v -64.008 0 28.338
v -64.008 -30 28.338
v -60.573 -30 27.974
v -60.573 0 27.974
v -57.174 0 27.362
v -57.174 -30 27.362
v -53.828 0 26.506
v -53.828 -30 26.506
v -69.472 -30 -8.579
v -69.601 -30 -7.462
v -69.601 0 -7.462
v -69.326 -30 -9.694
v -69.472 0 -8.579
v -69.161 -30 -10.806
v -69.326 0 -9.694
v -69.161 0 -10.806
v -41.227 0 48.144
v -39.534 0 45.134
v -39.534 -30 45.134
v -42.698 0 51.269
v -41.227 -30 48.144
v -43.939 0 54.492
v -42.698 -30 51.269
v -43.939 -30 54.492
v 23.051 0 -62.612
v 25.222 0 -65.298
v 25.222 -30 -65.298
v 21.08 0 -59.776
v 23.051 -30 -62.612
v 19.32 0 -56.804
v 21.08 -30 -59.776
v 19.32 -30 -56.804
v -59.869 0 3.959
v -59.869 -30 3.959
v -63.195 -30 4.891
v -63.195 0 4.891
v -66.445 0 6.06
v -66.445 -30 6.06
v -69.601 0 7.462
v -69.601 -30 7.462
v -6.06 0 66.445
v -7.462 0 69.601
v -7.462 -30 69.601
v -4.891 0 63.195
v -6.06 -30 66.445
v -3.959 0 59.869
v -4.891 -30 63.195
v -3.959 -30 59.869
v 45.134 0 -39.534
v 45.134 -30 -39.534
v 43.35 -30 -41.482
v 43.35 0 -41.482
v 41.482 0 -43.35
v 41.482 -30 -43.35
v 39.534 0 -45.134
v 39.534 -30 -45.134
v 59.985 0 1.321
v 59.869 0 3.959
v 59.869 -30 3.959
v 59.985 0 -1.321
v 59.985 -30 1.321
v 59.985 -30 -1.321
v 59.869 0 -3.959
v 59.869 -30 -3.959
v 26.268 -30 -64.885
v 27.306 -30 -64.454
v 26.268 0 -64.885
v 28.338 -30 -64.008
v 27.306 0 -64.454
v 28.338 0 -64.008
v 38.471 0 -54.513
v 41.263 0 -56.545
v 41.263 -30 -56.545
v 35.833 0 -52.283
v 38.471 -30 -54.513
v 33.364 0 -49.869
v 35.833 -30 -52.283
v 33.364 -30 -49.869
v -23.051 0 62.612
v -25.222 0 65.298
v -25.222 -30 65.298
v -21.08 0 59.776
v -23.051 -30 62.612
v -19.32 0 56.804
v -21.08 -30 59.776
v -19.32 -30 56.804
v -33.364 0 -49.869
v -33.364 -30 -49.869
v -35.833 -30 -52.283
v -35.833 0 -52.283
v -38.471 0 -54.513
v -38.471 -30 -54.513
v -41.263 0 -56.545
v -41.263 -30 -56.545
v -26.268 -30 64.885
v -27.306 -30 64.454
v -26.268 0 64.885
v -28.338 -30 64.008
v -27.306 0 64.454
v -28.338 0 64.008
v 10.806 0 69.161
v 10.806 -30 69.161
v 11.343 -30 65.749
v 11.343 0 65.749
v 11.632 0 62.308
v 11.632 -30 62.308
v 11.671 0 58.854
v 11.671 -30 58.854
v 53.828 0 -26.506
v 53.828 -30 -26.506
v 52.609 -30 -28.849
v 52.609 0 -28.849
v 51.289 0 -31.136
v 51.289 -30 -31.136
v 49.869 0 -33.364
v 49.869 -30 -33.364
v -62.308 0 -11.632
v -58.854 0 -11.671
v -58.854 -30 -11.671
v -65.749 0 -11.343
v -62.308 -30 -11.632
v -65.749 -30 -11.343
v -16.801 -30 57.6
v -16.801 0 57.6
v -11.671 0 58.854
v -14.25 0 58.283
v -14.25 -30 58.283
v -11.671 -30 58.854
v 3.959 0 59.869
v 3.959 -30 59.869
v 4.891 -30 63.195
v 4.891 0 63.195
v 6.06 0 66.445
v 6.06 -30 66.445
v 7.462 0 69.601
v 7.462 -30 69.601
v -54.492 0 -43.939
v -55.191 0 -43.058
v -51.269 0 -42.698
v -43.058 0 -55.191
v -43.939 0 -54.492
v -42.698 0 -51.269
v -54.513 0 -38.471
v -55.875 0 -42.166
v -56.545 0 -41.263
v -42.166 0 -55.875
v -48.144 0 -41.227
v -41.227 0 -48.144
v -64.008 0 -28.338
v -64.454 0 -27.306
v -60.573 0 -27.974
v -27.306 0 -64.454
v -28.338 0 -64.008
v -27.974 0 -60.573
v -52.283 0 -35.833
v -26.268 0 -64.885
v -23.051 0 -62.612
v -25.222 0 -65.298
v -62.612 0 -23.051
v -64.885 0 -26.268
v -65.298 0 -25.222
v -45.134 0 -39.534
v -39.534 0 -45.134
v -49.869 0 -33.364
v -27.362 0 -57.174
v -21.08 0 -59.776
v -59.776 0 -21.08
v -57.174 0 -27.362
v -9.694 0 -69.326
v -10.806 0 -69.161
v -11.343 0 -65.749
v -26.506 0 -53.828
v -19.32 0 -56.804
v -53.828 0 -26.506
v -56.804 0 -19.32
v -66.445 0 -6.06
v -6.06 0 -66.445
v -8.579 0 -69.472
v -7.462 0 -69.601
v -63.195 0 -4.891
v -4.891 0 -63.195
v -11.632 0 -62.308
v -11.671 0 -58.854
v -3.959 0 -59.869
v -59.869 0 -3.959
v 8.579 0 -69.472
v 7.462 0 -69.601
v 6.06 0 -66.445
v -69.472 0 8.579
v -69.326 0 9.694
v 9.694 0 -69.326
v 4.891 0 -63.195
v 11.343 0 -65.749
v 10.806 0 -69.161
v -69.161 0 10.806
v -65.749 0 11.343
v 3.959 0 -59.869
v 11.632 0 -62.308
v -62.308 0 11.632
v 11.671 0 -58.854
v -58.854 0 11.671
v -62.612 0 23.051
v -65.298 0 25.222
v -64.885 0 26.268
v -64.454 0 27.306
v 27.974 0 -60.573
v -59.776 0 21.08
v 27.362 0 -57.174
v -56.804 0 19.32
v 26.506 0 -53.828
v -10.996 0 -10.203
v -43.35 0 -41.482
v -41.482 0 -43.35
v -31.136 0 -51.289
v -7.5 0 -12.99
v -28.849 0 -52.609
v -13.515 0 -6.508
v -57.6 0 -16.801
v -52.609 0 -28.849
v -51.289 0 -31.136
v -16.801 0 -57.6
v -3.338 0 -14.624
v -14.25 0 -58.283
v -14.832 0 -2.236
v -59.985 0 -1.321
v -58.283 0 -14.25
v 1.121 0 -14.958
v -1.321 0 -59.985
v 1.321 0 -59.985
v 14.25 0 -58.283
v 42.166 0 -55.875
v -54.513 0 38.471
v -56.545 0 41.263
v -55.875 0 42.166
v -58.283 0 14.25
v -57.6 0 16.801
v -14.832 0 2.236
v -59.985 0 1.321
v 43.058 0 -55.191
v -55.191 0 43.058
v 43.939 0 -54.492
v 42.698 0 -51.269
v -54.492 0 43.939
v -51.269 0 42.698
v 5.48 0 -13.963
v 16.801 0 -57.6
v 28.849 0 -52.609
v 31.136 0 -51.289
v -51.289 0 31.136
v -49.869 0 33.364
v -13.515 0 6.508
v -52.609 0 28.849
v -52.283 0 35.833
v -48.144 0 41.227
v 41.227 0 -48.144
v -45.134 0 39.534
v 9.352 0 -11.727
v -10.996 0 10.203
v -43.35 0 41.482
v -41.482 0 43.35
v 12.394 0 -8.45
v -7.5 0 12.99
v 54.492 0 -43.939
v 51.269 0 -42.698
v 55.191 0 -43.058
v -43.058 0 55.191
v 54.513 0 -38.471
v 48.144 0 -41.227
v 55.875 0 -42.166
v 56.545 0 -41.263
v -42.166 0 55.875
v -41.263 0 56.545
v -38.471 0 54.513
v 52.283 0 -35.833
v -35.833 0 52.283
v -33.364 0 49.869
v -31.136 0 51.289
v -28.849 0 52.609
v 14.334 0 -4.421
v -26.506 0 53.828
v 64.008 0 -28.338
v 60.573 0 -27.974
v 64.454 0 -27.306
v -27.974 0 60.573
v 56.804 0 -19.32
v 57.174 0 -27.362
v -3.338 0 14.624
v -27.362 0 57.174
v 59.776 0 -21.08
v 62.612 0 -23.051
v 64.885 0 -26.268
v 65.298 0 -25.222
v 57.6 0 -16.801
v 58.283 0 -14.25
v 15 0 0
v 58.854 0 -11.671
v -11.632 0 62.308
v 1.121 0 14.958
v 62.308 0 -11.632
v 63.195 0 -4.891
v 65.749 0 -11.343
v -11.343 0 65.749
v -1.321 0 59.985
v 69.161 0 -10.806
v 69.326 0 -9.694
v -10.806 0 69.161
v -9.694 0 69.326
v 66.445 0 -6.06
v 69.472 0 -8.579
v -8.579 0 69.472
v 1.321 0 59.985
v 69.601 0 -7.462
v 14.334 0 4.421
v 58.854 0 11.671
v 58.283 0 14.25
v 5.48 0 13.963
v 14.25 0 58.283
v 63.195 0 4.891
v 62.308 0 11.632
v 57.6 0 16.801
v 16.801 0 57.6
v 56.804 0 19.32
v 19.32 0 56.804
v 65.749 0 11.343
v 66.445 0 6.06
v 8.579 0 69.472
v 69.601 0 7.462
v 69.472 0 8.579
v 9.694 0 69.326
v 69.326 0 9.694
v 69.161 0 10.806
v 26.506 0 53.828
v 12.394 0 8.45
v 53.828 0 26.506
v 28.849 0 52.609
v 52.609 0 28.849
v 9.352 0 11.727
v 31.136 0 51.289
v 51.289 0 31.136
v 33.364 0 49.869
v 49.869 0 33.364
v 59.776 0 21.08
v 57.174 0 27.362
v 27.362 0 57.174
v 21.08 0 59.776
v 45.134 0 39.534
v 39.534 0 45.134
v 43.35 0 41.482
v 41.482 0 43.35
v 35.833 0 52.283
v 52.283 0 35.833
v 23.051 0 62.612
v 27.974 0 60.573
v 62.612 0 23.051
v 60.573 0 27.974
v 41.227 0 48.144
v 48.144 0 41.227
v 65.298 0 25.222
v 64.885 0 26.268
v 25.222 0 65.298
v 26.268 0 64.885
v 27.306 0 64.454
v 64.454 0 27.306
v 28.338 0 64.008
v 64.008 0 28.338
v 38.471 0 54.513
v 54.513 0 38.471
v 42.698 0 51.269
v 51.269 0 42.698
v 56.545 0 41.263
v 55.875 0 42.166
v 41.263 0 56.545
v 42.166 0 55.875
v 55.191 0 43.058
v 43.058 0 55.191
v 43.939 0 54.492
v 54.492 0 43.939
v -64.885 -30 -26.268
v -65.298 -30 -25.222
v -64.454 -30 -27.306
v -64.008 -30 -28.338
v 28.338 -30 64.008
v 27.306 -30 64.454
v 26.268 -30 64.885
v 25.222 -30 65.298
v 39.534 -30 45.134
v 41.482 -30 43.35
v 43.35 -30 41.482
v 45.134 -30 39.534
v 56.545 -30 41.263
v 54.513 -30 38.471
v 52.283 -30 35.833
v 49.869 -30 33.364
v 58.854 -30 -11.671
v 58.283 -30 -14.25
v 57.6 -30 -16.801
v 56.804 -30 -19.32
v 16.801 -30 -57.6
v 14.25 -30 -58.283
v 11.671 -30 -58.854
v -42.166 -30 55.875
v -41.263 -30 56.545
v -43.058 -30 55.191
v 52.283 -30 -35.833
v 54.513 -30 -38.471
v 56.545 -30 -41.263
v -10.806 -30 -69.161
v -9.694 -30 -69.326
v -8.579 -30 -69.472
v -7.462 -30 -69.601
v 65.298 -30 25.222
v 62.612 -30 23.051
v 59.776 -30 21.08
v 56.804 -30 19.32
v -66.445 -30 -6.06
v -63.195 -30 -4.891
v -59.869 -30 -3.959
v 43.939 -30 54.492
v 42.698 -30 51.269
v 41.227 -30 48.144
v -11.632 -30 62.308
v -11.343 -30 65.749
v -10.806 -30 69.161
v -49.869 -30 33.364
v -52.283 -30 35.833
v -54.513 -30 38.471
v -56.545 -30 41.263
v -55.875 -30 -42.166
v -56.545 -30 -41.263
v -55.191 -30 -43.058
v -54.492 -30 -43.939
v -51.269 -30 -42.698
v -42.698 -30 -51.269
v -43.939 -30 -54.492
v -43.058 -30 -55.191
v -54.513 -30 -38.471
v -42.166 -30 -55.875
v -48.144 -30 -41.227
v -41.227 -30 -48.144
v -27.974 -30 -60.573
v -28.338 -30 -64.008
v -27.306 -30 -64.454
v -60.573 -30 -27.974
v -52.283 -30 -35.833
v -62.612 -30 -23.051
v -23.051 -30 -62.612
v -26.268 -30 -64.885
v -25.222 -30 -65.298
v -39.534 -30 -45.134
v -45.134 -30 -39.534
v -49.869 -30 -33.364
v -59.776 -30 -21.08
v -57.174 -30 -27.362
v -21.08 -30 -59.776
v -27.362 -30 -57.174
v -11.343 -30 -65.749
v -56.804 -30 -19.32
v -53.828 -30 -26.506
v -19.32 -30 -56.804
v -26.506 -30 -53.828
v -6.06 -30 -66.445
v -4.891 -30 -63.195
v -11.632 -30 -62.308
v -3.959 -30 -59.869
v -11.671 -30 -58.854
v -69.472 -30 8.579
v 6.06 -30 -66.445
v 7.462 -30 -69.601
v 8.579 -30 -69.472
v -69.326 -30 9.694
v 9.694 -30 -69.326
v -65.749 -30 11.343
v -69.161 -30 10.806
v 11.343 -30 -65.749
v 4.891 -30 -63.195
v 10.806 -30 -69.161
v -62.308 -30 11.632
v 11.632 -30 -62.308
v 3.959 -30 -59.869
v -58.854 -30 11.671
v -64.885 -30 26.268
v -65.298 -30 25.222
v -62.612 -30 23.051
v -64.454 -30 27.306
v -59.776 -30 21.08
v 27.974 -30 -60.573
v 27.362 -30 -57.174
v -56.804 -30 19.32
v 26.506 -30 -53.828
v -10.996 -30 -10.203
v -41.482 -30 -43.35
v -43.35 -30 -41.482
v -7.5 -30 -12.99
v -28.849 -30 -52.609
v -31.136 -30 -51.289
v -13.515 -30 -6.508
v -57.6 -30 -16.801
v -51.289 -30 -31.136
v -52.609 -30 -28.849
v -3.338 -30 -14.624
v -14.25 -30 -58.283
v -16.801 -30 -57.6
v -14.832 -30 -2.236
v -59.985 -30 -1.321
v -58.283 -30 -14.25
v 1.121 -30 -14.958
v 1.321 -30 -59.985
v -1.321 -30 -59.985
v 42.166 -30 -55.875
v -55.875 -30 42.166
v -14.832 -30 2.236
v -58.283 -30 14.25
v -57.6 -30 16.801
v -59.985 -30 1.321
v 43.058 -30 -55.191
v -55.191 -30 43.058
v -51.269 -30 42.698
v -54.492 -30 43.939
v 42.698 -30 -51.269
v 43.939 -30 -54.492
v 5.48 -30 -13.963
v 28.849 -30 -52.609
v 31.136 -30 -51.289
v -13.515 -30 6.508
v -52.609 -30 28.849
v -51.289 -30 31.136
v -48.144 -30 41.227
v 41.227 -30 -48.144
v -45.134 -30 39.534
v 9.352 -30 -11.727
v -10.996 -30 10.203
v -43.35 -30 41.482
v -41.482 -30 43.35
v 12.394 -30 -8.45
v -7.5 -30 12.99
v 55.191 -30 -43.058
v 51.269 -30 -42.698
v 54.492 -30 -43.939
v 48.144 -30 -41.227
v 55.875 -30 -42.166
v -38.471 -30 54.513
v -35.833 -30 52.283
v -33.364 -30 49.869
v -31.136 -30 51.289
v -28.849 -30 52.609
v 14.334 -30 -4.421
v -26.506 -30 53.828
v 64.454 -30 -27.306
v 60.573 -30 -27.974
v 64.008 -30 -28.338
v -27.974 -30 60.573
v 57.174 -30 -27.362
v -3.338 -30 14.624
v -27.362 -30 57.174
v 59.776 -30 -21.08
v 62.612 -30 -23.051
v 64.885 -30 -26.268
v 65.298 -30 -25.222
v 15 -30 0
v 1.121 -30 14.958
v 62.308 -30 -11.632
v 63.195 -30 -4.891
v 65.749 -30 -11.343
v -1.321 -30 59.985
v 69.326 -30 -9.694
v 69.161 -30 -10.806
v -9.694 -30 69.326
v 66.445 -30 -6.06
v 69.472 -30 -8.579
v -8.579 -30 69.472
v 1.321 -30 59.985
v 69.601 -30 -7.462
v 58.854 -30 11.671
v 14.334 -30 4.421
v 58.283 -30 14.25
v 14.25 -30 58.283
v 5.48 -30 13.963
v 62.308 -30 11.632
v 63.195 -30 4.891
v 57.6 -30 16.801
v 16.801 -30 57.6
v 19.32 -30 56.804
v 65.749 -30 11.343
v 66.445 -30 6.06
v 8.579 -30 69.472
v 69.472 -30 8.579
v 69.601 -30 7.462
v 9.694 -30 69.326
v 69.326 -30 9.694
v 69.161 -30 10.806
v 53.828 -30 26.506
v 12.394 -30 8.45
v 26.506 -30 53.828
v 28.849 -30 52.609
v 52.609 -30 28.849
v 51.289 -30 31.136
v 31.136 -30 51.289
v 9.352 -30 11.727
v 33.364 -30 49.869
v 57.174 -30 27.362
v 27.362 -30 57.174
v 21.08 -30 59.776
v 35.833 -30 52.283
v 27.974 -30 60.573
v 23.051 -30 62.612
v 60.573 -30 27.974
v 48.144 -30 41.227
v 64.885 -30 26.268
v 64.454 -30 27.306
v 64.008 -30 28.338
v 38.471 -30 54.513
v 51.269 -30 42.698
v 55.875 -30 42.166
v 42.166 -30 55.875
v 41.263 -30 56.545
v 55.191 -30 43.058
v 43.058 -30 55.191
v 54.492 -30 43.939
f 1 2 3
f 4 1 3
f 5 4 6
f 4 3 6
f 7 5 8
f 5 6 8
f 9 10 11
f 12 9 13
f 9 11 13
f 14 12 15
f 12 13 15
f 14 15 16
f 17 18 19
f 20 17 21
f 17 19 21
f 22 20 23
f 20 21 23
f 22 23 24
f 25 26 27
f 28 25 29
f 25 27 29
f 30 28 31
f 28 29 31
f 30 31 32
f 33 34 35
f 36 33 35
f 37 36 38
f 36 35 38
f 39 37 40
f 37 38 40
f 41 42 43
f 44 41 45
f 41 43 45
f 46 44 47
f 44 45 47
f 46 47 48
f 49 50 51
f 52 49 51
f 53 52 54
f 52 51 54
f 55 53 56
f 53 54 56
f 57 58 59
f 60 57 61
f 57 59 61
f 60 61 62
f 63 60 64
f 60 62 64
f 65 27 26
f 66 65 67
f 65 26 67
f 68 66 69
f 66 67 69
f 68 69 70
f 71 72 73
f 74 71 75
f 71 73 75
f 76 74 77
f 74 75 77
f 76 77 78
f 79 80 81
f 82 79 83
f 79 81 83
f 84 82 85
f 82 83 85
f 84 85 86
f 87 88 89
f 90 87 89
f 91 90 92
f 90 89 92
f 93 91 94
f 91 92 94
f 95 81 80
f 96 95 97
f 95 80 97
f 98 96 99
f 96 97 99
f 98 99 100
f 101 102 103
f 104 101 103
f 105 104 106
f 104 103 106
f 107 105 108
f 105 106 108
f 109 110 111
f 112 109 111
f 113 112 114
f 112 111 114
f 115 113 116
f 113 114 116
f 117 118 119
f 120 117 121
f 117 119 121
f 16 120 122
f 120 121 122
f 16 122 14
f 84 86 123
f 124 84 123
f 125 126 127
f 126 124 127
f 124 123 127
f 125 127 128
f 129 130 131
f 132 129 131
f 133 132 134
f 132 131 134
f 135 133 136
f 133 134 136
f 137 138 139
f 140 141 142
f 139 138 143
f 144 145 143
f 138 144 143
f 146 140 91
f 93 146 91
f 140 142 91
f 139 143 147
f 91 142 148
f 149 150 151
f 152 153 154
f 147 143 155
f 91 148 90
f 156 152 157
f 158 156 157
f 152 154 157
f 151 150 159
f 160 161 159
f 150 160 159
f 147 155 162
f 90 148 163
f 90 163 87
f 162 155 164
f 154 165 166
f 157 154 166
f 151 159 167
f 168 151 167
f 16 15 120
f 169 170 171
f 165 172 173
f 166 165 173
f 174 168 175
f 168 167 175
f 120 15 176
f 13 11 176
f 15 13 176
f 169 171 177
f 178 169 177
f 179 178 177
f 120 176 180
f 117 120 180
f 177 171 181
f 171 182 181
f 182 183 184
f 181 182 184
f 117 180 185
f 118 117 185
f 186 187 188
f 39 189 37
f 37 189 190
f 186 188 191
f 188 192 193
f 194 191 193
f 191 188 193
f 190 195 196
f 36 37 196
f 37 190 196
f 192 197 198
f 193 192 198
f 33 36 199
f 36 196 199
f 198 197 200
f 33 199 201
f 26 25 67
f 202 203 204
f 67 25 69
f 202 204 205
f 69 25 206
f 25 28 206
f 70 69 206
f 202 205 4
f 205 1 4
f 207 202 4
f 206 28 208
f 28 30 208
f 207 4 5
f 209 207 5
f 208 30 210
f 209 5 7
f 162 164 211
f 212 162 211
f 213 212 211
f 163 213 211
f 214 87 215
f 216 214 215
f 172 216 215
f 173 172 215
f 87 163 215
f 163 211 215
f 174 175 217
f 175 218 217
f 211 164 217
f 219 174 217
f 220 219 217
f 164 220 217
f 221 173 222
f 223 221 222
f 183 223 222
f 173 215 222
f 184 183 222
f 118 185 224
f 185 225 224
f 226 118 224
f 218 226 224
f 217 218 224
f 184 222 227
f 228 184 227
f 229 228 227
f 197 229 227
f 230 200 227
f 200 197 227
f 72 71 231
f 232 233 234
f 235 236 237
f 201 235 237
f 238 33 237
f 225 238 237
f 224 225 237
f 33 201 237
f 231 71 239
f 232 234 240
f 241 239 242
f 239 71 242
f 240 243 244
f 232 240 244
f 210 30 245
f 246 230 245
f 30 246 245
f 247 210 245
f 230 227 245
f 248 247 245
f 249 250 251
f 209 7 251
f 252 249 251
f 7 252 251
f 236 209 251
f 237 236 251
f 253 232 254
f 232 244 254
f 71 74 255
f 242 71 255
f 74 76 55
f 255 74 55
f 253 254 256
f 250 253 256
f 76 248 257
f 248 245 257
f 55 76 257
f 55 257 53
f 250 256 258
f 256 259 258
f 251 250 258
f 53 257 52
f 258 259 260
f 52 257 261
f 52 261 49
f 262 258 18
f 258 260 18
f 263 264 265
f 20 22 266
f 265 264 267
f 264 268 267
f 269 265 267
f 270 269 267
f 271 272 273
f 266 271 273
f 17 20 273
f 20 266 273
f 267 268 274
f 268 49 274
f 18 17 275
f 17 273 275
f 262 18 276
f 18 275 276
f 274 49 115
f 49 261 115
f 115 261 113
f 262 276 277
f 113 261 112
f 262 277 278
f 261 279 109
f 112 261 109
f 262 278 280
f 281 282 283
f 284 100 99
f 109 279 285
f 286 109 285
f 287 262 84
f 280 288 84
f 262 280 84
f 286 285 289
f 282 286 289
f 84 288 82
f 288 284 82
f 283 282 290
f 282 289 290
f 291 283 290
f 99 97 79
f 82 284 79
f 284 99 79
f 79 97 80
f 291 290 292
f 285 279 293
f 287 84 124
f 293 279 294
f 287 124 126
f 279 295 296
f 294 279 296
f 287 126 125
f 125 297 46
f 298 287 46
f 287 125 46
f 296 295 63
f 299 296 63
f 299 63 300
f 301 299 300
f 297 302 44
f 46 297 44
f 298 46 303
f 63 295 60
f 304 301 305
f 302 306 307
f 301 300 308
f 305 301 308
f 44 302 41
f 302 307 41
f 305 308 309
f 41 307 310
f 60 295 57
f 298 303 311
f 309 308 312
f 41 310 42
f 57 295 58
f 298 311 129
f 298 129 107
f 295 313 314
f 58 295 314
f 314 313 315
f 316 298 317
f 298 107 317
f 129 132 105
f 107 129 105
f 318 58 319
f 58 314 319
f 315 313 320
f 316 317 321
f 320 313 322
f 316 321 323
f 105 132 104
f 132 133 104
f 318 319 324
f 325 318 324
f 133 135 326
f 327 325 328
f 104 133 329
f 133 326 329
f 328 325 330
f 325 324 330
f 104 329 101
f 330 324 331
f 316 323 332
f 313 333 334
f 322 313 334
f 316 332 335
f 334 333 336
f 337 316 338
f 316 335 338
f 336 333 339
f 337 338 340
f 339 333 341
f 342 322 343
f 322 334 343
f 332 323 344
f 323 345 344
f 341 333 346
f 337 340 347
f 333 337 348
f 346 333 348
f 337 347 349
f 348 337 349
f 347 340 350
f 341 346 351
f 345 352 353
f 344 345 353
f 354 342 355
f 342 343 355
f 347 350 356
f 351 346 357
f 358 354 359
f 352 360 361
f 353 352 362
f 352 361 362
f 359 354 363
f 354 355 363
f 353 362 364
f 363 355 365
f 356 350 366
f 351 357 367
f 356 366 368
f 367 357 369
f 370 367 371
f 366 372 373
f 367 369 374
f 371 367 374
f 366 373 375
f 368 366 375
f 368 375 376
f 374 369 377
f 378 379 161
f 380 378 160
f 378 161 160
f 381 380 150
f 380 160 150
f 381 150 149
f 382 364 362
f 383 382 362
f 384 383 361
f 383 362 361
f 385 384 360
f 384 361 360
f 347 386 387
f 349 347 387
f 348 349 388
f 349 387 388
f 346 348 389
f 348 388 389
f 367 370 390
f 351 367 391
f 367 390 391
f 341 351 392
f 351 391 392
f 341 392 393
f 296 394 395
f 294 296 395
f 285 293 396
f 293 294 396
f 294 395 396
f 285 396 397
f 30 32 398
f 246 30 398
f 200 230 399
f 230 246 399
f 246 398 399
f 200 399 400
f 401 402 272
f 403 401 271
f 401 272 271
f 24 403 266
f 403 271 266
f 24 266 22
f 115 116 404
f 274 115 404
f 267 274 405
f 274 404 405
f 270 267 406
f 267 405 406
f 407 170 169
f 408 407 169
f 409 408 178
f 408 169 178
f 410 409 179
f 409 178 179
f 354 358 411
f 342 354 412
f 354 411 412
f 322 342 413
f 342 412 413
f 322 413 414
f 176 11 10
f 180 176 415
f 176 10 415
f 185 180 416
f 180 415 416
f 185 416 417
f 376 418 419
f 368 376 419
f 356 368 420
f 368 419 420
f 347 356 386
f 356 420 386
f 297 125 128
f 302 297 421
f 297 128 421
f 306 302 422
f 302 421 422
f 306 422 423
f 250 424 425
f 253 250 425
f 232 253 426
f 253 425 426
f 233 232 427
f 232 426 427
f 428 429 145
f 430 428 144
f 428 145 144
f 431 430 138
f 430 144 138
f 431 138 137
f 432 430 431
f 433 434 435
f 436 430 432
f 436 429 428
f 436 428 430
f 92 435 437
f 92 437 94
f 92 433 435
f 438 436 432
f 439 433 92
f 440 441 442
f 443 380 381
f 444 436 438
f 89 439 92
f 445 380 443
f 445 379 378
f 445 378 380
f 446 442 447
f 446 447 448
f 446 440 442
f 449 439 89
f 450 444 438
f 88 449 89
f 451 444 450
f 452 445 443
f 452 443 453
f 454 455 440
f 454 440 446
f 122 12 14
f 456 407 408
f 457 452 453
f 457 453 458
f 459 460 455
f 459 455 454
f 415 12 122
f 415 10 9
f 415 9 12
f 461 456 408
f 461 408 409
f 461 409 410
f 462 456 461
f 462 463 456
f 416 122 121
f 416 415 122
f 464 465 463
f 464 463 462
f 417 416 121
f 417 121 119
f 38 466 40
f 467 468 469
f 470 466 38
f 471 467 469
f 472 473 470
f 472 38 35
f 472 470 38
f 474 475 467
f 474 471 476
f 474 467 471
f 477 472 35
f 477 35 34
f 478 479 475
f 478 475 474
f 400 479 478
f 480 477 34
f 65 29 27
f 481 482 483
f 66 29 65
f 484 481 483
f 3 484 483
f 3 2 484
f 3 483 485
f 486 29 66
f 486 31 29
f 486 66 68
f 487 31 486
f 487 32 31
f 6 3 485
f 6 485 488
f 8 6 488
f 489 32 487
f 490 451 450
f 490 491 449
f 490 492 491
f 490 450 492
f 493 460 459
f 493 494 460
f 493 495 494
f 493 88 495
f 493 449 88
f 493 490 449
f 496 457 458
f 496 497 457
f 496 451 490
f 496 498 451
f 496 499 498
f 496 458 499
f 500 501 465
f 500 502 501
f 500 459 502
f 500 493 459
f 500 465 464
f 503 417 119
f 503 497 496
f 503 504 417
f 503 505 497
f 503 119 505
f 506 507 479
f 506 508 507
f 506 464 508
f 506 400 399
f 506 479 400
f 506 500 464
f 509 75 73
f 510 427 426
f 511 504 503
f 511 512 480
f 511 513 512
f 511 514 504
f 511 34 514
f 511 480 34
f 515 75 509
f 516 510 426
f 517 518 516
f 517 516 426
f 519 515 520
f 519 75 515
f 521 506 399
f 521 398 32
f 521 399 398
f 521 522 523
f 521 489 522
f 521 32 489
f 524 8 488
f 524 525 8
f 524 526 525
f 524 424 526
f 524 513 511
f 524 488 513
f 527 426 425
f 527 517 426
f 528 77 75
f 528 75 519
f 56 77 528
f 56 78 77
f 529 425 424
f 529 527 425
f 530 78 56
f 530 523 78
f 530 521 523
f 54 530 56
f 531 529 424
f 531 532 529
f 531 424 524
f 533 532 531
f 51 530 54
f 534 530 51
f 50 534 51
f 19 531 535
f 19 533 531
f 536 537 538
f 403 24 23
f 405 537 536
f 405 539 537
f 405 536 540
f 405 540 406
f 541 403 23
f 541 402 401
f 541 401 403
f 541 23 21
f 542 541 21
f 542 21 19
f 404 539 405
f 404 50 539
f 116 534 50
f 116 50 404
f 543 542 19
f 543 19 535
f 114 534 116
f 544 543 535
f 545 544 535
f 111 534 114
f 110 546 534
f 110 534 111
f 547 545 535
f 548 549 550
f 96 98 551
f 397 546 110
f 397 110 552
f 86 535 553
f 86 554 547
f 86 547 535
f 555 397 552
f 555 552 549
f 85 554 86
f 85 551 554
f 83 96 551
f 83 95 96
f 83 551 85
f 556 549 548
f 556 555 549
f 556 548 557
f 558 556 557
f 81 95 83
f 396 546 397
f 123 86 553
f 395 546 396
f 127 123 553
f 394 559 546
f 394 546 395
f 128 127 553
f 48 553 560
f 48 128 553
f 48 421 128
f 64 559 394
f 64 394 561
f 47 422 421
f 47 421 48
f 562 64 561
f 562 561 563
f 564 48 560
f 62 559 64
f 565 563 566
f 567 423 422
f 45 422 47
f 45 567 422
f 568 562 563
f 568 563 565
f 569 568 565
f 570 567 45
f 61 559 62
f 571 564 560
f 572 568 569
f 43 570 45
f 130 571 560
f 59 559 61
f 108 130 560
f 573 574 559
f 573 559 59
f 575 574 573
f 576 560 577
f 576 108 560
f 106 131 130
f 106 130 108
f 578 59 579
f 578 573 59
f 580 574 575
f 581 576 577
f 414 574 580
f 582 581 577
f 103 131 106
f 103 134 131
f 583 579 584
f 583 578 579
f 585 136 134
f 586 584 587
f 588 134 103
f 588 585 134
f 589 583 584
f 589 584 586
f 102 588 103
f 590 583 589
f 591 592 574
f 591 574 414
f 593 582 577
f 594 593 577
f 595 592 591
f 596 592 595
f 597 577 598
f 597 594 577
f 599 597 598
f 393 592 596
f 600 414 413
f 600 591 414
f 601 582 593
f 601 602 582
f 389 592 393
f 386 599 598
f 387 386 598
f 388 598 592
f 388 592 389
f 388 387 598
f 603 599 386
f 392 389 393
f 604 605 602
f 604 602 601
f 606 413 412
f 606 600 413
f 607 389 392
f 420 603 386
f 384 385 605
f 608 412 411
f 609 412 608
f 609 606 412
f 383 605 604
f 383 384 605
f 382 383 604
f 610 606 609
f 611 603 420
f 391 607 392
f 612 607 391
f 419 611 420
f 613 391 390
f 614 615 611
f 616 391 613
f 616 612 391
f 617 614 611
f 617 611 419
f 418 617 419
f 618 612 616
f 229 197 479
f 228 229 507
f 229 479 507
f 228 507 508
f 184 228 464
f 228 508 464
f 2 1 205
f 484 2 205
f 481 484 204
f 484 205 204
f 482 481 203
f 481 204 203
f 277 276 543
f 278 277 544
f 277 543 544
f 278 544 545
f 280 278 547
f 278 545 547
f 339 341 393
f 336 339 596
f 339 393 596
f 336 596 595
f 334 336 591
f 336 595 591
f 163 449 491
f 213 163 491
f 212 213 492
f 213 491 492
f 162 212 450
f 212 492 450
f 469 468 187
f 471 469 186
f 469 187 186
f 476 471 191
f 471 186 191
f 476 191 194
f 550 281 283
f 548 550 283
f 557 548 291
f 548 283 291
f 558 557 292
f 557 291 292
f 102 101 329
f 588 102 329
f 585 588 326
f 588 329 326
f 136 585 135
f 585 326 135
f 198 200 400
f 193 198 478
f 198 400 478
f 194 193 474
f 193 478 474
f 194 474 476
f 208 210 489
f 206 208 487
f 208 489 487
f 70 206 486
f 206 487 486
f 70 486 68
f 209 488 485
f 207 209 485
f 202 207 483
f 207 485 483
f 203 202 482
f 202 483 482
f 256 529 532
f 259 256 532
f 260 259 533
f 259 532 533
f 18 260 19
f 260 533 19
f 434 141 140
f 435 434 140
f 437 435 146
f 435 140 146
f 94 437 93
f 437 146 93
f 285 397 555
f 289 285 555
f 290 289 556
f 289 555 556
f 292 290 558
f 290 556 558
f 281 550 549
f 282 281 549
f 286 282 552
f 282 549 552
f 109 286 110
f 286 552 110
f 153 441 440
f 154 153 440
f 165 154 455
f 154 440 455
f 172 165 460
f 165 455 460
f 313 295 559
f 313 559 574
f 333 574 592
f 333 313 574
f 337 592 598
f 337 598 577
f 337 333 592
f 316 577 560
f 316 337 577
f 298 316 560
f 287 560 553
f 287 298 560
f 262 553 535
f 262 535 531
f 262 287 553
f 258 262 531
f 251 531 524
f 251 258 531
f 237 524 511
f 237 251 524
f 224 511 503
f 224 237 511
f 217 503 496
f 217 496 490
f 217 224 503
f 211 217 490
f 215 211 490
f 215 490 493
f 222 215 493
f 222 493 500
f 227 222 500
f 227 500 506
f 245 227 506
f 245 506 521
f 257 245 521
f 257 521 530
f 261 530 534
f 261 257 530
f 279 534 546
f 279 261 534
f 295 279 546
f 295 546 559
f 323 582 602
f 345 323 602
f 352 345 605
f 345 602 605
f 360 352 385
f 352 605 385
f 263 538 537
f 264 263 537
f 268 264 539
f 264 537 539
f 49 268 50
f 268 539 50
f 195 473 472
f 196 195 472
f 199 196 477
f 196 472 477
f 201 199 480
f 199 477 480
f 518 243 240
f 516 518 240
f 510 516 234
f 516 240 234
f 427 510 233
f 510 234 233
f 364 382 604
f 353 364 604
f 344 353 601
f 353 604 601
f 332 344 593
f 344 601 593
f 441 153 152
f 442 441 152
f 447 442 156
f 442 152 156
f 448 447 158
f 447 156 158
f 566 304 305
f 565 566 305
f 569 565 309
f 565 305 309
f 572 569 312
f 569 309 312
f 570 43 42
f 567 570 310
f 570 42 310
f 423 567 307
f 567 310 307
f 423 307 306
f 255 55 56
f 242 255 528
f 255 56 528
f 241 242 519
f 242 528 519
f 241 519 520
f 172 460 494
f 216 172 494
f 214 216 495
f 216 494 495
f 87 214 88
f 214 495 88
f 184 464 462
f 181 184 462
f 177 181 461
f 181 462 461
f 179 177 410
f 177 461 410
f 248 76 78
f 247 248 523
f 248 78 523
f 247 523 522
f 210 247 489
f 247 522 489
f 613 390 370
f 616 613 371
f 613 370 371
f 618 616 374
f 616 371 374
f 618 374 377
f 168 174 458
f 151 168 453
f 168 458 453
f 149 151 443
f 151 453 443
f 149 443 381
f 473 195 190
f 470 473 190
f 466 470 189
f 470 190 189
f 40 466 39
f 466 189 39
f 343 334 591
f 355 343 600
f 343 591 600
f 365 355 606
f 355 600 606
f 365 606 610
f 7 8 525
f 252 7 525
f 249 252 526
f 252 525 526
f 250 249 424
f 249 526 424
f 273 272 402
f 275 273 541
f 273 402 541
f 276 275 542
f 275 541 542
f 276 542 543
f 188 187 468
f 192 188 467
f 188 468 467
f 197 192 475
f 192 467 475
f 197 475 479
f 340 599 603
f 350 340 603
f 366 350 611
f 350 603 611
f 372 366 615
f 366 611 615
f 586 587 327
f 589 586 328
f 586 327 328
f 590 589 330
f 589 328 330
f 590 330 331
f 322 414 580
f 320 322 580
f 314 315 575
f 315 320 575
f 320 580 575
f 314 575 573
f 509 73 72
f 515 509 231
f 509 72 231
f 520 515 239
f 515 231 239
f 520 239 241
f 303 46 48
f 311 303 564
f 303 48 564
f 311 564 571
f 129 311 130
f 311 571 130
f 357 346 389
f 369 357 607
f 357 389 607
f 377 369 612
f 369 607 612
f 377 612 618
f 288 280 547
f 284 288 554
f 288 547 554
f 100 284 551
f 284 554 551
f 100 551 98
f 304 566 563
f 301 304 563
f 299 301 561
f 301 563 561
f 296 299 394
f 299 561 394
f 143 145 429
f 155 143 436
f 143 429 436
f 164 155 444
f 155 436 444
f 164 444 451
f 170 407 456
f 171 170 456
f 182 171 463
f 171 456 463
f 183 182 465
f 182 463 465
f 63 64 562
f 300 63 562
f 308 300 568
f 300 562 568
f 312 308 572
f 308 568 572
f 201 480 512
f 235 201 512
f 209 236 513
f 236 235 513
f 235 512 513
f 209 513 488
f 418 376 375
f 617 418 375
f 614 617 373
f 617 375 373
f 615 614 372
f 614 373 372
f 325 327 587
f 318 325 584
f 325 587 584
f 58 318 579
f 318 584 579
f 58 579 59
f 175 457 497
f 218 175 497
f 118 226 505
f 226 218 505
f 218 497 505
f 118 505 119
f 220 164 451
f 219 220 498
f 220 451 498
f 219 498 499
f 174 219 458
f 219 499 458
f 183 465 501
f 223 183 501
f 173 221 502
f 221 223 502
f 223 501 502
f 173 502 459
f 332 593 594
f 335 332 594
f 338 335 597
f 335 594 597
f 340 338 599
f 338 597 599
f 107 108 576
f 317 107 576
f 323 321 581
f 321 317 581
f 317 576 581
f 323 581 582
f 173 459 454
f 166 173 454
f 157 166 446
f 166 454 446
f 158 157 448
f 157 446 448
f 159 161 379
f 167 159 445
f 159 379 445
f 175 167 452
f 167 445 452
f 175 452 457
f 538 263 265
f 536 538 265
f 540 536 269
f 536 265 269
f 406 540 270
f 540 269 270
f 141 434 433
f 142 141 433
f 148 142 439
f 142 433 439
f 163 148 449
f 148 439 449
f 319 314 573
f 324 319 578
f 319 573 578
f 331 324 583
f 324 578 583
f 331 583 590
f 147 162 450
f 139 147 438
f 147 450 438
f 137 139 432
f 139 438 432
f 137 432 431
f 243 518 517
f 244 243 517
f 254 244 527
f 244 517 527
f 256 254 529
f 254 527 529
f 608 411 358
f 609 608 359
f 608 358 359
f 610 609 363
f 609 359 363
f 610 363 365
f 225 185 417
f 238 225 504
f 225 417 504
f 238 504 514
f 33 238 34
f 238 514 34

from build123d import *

# Parameters (mm, degrees)
F0_R     = 70
F0_R_2   = 15
F1_DEPTH = 30
F3_DEPTH = 31


with BuildPart() as f1:
    # F0 (on Front) → F1 (new body)
    with BuildSketch(Plane.XZ):
        Circle(F0_R)
        Circle(F0_R_2, mode=Mode.SUBTRACT)
    extrude(amount=F1_DEPTH)

    # F2 (on face) → F3 (cut)
    with BuildSketch(Plane.XZ.offset(30)):
        with BuildLine():
            ThreePointArc((3.959342, 59.869221), (5.917735, 66.084931), (8.705645, 71.975425))
            ThreePointArc((8.705645, 71.975425), (0, 72.5), (-8.705645, 71.975425))
            ThreePointArc((-8.705645, 71.975425), (-5.917735, 66.084931), (-3.959342, 59.869221))
            ThreePointArc((-3.959342, 59.869221), (0, 60), (3.959342, 59.869221))
        make_face()
        with BuildLine():
            ThreePointArc((-11.670864, 58.85398), (-11.387945, 65.364764), (-10.219603, 71.776108))
            ThreePointArc((-10.219603, 71.776108), (-18.764381, 70.029622), (-27.037618, 67.269735))
            ThreePointArc((-27.037618, 67.269735), (-22.820132, 62.301519), (-19.319725, 56.804474))
            ThreePointArc((-19.319725, 56.804474), (-15.529143, 57.95555), (-11.670864, 58.85398))
        make_face()
        with BuildLine():
            ThreePointArc((-26.50572, 53.827937), (-27.917556, 60.190097), (-28.448402, 66.685369))
            ThreePointArc((-28.448402, 66.685369), (-36.25, 62.786842), (-43.527022, 57.979724))
            ThreePointArc((-43.527022, 57.979724), (-38.167375, 54.272361), (-33.363501, 49.868595))
            ThreePointArc((-33.363501, 49.868595), (-30, 51.961524), (-26.50572, 53.827937))
        make_face()
        with BuildLine():
            ThreePointArc((-39.534255, 45.13361), (-42.544632, 50.913574), (-44.73849, 57.050132))
            ThreePointArc((-44.73849, 57.050132), (-51.265242, 51.265242), (-57.050132, 44.73849))
            ThreePointArc((-57.050132, 44.73849), (-50.913574, 42.544632), (-45.13361, 39.534255))
            ThreePointArc((-45.13361, 39.534255), (-42.426407, 42.426407), (-39.534255, 45.13361))
        make_face()
        with BuildLine():
            ThreePointArc((-49.868595, 33.363501), (-54.272361, 38.167375), (-57.979724, 43.527022))
            ThreePointArc((-57.979724, 43.527022), (-62.786842, 36.25), (-66.685369, 28.448402))
            ThreePointArc((-66.685369, 28.448402), (-60.190097, 27.917556), (-53.827937, 26.50572))
            ThreePointArc((-53.827937, 26.50572), (-51.961524, 30), (-49.868595, 33.363501))
        make_face()
        with BuildLine():
            ThreePointArc((-56.804474, 19.319725), (-62.301519, 22.820132), (-67.269735, 27.037618))
            ThreePointArc((-67.269735, 27.037618), (-70.029622, 18.764381), (-71.776108, 10.219603))
            ThreePointArc((-71.776108, 10.219603), (-65.364764, 11.387945), (-58.85398, 11.670864))
            ThreePointArc((-58.85398, 11.670864), (-57.95555, 15.529143), (-56.804474, 19.319725))
        make_face()
        with BuildLine():
            ThreePointArc((-59.869221, 3.959342), (-66.084931, 5.917735), (-71.975425, 8.705645))
            ThreePointArc((-71.975425, 8.705645), (-72.5, 0), (-71.975425, -8.705645))
            ThreePointArc((-71.975425, -8.705645), (-66.084931, -5.917735), (-59.869221, -3.959342))
            ThreePointArc((-59.869221, -3.959342), (-60, 0), (-59.869221, 3.959342))
        make_face()
        with BuildLine():
            ThreePointArc((-58.85398, -11.670864), (-65.364764, -11.387945), (-71.776108, -10.219603))
            ThreePointArc((-71.776108, -10.219603), (-70.029622, -18.764381), (-67.269735, -27.037618))
            ThreePointArc((-67.269735, -27.037618), (-62.301519, -22.820132), (-56.804474, -19.319725))
            ThreePointArc((-56.804474, -19.319725), (-57.95555, -15.529143), (-58.85398, -11.670864))
        make_face()
        with BuildLine():
            ThreePointArc((-53.827937, -26.50572), (-60.190097, -27.917556), (-66.685369, -28.448402))
            ThreePointArc((-66.685369, -28.448402), (-62.786842, -36.25), (-57.979724, -43.527022))
            ThreePointArc((-57.979724, -43.527022), (-54.272361, -38.167375), (-49.868595, -33.363501))
            ThreePointArc((-49.868595, -33.363501), (-51.961524, -30), (-53.827937, -26.50572))
        make_face()
        with BuildLine():
            ThreePointArc((-45.13361, -39.534255), (-50.913574, -42.544632), (-57.050132, -44.73849))
            ThreePointArc((-57.050132, -44.73849), (-51.265242, -51.265242), (-44.73849, -57.050132))
            ThreePointArc((-44.73849, -57.050132), (-42.544632, -50.913574), (-39.534255, -45.13361))
            ThreePointArc((-39.534255, -45.13361), (-42.426407, -42.426407), (-45.13361, -39.534255))
        make_face()
        with BuildLine():
            ThreePointArc((-33.363501, -49.868595), (-38.167375, -54.272361), (-43.527022, -57.979724))
            ThreePointArc((-43.527022, -57.979724), (-36.25, -62.786842), (-28.448402, -66.685369))
            ThreePointArc((-28.448402, -66.685369), (-27.917556, -60.190097), (-26.50572, -53.827937))
            ThreePointArc((-26.50572, -53.827937), (-30, -51.961524), (-33.363501, -49.868595))
        make_face()
        with BuildLine():
            ThreePointArc((-19.319725, -56.804474), (-22.820132, -62.301519), (-27.037618, -67.269735))
            ThreePointArc((-27.037618, -67.269735), (-18.764381, -70.029622), (-10.219603, -71.776108))
            ThreePointArc((-10.219603, -71.776108), (-11.387945, -65.364764), (-11.670864, -58.85398))
            ThreePointArc((-11.670864, -58.85398), (-15.529143, -57.95555), (-19.319725, -56.804474))
        make_face()
        with BuildLine():
            ThreePointArc((-3.959342, -59.869221), (-5.917735, -66.084931), (-8.705645, -71.975425))
            ThreePointArc((-8.705645, -71.975425), (0, -72.5), (8.705645, -71.975425))
            ThreePointArc((8.705645, -71.975425), (5.917735, -66.084931), (3.959342, -59.869221))
            ThreePointArc((3.959342, -59.869221), (0, -60), (-3.959342, -59.869221))
        make_face()
        with BuildLine():
            ThreePointArc((11.670864, -58.85398), (11.387945, -65.364764), (10.219603, -71.776108))
            ThreePointArc((10.219603, -71.776108), (18.764381, -70.029622), (27.037618, -67.269735))
            ThreePointArc((27.037618, -67.269735), (22.820132, -62.301519), (19.319725, -56.804474))
            ThreePointArc((19.319725, -56.804474), (15.529143, -57.95555), (11.670864, -58.85398))
        make_face()
        with BuildLine():
            ThreePointArc((26.50572, -53.827937), (27.917556, -60.190097), (28.448402, -66.685369))
            ThreePointArc((28.448402, -66.685369), (36.25, -62.786842), (43.527022, -57.979724))
            ThreePointArc((43.527022, -57.979724), (38.167375, -54.272361), (33.363501, -49.868595))
            ThreePointArc((33.363501, -49.868595), (30, -51.961524), (26.50572, -53.827937))
        make_face()
        with BuildLine():
            ThreePointArc((39.534255, -45.13361), (42.544632, -50.913574), (44.73849, -57.050132))
            ThreePointArc((44.73849, -57.050132), (51.265242, -51.265242), (57.050132, -44.73849))
            ThreePointArc((57.050132, -44.73849), (50.913574, -42.544632), (45.13361, -39.534255))
            ThreePointArc((45.13361, -39.534255), (42.426407, -42.426407), (39.534255, -45.13361))
        make_face()
        with BuildLine():
            ThreePointArc((49.868595, -33.363501), (54.272361, -38.167375), (57.979724, -43.527022))
            ThreePointArc((57.979724, -43.527022), (62.786842, -36.25), (66.685369, -28.448402))
            ThreePointArc((66.685369, -28.448402), (60.190097, -27.917556), (53.827937, -26.50572))
            ThreePointArc((53.827937, -26.50572), (51.961524, -30), (49.868595, -33.363501))
        make_face()
        with BuildLine():
            ThreePointArc((56.804474, -19.319725), (62.301519, -22.820132), (67.269735, -27.037618))
            ThreePointArc((67.269735, -27.037618), (70.029622, -18.764381), (71.776108, -10.219603))
            ThreePointArc((71.776108, -10.219603), (65.364764, -11.387945), (58.85398, -11.670864))
            ThreePointArc((58.85398, -11.670864), (57.95555, -15.529143), (56.804474, -19.319725))
        make_face()
        with BuildLine():
            ThreePointArc((59.869221, -3.959342), (66.084931, -5.917735), (71.975425, -8.705645))
            ThreePointArc((71.975425, -8.705645), (72.5, 0), (71.975425, 8.705645))
            ThreePointArc((71.975425, 8.705645), (66.084931, 5.917735), (59.869221, 3.959342))
            ThreePointArc((59.869221, 3.959342), (60, 0), (59.869221, -3.959342))
        make_face()
        with BuildLine():
            ThreePointArc((58.85398, 11.670864), (65.364764, 11.387945), (71.776108, 10.219603))
            ThreePointArc((71.776108, 10.219603), (70.029622, 18.764381), (67.269735, 27.037618))
            ThreePointArc((67.269735, 27.037618), (62.301519, 22.820132), (56.804474, 19.319725))
            ThreePointArc((56.804474, 19.319725), (57.95555, 15.529143), (58.85398, 11.670864))
        make_face()
        with BuildLine():
            ThreePointArc((53.827937, 26.50572), (60.190097, 27.917556), (66.685369, 28.448402))
            ThreePointArc((66.685369, 28.448402), (62.786842, 36.25), (57.979724, 43.527022))
            ThreePointArc((57.979724, 43.527022), (54.272361, 38.167375), (49.868595, 33.363501))
            ThreePointArc((49.868595, 33.363501), (51.961524, 30), (53.827937, 26.50572))
        make_face()
        with BuildLine():
            ThreePointArc((45.13361, 39.534255), (50.913574, 42.544632), (57.050132, 44.73849))
            ThreePointArc((57.050132, 44.73849), (51.265242, 51.265242), (44.73849, 57.050132))
            ThreePointArc((44.73849, 57.050132), (42.544632, 50.913574), (39.534255, 45.13361))
            ThreePointArc((39.534255, 45.13361), (42.426407, 42.426407), (45.13361, 39.534255))
        make_face()
        with BuildLine():
            ThreePointArc((33.363501, 49.868595), (38.167375, 54.272361), (43.527022, 57.979724))
            ThreePointArc((43.527022, 57.979724), (36.25, 62.786842), (28.448402, 66.685369))
            ThreePointArc((28.448402, 66.685369), (27.917556, 60.190097), (26.50572, 53.827937))
            ThreePointArc((26.50572, 53.827937), (30, 51.961524), (33.363501, 49.868595))
        make_face()
        with BuildLine():
            ThreePointArc((19.319725, 56.804474), (22.820132, 62.301519), (27.037618, 67.269735))
            ThreePointArc((27.037618, 67.269735), (18.764381, 70.029622), (10.219603, 71.776108))
            ThreePointArc((10.219603, 71.776108), (11.387945, 65.364764), (11.670864, 58.85398))
            ThreePointArc((11.670864, 58.85398), (15.529143, 57.95555), (19.319725, 56.804474))
        make_face()
    extrude(amount=-F3_DEPTH, mode=Mode.SUBTRACT)


solid = f1.part
